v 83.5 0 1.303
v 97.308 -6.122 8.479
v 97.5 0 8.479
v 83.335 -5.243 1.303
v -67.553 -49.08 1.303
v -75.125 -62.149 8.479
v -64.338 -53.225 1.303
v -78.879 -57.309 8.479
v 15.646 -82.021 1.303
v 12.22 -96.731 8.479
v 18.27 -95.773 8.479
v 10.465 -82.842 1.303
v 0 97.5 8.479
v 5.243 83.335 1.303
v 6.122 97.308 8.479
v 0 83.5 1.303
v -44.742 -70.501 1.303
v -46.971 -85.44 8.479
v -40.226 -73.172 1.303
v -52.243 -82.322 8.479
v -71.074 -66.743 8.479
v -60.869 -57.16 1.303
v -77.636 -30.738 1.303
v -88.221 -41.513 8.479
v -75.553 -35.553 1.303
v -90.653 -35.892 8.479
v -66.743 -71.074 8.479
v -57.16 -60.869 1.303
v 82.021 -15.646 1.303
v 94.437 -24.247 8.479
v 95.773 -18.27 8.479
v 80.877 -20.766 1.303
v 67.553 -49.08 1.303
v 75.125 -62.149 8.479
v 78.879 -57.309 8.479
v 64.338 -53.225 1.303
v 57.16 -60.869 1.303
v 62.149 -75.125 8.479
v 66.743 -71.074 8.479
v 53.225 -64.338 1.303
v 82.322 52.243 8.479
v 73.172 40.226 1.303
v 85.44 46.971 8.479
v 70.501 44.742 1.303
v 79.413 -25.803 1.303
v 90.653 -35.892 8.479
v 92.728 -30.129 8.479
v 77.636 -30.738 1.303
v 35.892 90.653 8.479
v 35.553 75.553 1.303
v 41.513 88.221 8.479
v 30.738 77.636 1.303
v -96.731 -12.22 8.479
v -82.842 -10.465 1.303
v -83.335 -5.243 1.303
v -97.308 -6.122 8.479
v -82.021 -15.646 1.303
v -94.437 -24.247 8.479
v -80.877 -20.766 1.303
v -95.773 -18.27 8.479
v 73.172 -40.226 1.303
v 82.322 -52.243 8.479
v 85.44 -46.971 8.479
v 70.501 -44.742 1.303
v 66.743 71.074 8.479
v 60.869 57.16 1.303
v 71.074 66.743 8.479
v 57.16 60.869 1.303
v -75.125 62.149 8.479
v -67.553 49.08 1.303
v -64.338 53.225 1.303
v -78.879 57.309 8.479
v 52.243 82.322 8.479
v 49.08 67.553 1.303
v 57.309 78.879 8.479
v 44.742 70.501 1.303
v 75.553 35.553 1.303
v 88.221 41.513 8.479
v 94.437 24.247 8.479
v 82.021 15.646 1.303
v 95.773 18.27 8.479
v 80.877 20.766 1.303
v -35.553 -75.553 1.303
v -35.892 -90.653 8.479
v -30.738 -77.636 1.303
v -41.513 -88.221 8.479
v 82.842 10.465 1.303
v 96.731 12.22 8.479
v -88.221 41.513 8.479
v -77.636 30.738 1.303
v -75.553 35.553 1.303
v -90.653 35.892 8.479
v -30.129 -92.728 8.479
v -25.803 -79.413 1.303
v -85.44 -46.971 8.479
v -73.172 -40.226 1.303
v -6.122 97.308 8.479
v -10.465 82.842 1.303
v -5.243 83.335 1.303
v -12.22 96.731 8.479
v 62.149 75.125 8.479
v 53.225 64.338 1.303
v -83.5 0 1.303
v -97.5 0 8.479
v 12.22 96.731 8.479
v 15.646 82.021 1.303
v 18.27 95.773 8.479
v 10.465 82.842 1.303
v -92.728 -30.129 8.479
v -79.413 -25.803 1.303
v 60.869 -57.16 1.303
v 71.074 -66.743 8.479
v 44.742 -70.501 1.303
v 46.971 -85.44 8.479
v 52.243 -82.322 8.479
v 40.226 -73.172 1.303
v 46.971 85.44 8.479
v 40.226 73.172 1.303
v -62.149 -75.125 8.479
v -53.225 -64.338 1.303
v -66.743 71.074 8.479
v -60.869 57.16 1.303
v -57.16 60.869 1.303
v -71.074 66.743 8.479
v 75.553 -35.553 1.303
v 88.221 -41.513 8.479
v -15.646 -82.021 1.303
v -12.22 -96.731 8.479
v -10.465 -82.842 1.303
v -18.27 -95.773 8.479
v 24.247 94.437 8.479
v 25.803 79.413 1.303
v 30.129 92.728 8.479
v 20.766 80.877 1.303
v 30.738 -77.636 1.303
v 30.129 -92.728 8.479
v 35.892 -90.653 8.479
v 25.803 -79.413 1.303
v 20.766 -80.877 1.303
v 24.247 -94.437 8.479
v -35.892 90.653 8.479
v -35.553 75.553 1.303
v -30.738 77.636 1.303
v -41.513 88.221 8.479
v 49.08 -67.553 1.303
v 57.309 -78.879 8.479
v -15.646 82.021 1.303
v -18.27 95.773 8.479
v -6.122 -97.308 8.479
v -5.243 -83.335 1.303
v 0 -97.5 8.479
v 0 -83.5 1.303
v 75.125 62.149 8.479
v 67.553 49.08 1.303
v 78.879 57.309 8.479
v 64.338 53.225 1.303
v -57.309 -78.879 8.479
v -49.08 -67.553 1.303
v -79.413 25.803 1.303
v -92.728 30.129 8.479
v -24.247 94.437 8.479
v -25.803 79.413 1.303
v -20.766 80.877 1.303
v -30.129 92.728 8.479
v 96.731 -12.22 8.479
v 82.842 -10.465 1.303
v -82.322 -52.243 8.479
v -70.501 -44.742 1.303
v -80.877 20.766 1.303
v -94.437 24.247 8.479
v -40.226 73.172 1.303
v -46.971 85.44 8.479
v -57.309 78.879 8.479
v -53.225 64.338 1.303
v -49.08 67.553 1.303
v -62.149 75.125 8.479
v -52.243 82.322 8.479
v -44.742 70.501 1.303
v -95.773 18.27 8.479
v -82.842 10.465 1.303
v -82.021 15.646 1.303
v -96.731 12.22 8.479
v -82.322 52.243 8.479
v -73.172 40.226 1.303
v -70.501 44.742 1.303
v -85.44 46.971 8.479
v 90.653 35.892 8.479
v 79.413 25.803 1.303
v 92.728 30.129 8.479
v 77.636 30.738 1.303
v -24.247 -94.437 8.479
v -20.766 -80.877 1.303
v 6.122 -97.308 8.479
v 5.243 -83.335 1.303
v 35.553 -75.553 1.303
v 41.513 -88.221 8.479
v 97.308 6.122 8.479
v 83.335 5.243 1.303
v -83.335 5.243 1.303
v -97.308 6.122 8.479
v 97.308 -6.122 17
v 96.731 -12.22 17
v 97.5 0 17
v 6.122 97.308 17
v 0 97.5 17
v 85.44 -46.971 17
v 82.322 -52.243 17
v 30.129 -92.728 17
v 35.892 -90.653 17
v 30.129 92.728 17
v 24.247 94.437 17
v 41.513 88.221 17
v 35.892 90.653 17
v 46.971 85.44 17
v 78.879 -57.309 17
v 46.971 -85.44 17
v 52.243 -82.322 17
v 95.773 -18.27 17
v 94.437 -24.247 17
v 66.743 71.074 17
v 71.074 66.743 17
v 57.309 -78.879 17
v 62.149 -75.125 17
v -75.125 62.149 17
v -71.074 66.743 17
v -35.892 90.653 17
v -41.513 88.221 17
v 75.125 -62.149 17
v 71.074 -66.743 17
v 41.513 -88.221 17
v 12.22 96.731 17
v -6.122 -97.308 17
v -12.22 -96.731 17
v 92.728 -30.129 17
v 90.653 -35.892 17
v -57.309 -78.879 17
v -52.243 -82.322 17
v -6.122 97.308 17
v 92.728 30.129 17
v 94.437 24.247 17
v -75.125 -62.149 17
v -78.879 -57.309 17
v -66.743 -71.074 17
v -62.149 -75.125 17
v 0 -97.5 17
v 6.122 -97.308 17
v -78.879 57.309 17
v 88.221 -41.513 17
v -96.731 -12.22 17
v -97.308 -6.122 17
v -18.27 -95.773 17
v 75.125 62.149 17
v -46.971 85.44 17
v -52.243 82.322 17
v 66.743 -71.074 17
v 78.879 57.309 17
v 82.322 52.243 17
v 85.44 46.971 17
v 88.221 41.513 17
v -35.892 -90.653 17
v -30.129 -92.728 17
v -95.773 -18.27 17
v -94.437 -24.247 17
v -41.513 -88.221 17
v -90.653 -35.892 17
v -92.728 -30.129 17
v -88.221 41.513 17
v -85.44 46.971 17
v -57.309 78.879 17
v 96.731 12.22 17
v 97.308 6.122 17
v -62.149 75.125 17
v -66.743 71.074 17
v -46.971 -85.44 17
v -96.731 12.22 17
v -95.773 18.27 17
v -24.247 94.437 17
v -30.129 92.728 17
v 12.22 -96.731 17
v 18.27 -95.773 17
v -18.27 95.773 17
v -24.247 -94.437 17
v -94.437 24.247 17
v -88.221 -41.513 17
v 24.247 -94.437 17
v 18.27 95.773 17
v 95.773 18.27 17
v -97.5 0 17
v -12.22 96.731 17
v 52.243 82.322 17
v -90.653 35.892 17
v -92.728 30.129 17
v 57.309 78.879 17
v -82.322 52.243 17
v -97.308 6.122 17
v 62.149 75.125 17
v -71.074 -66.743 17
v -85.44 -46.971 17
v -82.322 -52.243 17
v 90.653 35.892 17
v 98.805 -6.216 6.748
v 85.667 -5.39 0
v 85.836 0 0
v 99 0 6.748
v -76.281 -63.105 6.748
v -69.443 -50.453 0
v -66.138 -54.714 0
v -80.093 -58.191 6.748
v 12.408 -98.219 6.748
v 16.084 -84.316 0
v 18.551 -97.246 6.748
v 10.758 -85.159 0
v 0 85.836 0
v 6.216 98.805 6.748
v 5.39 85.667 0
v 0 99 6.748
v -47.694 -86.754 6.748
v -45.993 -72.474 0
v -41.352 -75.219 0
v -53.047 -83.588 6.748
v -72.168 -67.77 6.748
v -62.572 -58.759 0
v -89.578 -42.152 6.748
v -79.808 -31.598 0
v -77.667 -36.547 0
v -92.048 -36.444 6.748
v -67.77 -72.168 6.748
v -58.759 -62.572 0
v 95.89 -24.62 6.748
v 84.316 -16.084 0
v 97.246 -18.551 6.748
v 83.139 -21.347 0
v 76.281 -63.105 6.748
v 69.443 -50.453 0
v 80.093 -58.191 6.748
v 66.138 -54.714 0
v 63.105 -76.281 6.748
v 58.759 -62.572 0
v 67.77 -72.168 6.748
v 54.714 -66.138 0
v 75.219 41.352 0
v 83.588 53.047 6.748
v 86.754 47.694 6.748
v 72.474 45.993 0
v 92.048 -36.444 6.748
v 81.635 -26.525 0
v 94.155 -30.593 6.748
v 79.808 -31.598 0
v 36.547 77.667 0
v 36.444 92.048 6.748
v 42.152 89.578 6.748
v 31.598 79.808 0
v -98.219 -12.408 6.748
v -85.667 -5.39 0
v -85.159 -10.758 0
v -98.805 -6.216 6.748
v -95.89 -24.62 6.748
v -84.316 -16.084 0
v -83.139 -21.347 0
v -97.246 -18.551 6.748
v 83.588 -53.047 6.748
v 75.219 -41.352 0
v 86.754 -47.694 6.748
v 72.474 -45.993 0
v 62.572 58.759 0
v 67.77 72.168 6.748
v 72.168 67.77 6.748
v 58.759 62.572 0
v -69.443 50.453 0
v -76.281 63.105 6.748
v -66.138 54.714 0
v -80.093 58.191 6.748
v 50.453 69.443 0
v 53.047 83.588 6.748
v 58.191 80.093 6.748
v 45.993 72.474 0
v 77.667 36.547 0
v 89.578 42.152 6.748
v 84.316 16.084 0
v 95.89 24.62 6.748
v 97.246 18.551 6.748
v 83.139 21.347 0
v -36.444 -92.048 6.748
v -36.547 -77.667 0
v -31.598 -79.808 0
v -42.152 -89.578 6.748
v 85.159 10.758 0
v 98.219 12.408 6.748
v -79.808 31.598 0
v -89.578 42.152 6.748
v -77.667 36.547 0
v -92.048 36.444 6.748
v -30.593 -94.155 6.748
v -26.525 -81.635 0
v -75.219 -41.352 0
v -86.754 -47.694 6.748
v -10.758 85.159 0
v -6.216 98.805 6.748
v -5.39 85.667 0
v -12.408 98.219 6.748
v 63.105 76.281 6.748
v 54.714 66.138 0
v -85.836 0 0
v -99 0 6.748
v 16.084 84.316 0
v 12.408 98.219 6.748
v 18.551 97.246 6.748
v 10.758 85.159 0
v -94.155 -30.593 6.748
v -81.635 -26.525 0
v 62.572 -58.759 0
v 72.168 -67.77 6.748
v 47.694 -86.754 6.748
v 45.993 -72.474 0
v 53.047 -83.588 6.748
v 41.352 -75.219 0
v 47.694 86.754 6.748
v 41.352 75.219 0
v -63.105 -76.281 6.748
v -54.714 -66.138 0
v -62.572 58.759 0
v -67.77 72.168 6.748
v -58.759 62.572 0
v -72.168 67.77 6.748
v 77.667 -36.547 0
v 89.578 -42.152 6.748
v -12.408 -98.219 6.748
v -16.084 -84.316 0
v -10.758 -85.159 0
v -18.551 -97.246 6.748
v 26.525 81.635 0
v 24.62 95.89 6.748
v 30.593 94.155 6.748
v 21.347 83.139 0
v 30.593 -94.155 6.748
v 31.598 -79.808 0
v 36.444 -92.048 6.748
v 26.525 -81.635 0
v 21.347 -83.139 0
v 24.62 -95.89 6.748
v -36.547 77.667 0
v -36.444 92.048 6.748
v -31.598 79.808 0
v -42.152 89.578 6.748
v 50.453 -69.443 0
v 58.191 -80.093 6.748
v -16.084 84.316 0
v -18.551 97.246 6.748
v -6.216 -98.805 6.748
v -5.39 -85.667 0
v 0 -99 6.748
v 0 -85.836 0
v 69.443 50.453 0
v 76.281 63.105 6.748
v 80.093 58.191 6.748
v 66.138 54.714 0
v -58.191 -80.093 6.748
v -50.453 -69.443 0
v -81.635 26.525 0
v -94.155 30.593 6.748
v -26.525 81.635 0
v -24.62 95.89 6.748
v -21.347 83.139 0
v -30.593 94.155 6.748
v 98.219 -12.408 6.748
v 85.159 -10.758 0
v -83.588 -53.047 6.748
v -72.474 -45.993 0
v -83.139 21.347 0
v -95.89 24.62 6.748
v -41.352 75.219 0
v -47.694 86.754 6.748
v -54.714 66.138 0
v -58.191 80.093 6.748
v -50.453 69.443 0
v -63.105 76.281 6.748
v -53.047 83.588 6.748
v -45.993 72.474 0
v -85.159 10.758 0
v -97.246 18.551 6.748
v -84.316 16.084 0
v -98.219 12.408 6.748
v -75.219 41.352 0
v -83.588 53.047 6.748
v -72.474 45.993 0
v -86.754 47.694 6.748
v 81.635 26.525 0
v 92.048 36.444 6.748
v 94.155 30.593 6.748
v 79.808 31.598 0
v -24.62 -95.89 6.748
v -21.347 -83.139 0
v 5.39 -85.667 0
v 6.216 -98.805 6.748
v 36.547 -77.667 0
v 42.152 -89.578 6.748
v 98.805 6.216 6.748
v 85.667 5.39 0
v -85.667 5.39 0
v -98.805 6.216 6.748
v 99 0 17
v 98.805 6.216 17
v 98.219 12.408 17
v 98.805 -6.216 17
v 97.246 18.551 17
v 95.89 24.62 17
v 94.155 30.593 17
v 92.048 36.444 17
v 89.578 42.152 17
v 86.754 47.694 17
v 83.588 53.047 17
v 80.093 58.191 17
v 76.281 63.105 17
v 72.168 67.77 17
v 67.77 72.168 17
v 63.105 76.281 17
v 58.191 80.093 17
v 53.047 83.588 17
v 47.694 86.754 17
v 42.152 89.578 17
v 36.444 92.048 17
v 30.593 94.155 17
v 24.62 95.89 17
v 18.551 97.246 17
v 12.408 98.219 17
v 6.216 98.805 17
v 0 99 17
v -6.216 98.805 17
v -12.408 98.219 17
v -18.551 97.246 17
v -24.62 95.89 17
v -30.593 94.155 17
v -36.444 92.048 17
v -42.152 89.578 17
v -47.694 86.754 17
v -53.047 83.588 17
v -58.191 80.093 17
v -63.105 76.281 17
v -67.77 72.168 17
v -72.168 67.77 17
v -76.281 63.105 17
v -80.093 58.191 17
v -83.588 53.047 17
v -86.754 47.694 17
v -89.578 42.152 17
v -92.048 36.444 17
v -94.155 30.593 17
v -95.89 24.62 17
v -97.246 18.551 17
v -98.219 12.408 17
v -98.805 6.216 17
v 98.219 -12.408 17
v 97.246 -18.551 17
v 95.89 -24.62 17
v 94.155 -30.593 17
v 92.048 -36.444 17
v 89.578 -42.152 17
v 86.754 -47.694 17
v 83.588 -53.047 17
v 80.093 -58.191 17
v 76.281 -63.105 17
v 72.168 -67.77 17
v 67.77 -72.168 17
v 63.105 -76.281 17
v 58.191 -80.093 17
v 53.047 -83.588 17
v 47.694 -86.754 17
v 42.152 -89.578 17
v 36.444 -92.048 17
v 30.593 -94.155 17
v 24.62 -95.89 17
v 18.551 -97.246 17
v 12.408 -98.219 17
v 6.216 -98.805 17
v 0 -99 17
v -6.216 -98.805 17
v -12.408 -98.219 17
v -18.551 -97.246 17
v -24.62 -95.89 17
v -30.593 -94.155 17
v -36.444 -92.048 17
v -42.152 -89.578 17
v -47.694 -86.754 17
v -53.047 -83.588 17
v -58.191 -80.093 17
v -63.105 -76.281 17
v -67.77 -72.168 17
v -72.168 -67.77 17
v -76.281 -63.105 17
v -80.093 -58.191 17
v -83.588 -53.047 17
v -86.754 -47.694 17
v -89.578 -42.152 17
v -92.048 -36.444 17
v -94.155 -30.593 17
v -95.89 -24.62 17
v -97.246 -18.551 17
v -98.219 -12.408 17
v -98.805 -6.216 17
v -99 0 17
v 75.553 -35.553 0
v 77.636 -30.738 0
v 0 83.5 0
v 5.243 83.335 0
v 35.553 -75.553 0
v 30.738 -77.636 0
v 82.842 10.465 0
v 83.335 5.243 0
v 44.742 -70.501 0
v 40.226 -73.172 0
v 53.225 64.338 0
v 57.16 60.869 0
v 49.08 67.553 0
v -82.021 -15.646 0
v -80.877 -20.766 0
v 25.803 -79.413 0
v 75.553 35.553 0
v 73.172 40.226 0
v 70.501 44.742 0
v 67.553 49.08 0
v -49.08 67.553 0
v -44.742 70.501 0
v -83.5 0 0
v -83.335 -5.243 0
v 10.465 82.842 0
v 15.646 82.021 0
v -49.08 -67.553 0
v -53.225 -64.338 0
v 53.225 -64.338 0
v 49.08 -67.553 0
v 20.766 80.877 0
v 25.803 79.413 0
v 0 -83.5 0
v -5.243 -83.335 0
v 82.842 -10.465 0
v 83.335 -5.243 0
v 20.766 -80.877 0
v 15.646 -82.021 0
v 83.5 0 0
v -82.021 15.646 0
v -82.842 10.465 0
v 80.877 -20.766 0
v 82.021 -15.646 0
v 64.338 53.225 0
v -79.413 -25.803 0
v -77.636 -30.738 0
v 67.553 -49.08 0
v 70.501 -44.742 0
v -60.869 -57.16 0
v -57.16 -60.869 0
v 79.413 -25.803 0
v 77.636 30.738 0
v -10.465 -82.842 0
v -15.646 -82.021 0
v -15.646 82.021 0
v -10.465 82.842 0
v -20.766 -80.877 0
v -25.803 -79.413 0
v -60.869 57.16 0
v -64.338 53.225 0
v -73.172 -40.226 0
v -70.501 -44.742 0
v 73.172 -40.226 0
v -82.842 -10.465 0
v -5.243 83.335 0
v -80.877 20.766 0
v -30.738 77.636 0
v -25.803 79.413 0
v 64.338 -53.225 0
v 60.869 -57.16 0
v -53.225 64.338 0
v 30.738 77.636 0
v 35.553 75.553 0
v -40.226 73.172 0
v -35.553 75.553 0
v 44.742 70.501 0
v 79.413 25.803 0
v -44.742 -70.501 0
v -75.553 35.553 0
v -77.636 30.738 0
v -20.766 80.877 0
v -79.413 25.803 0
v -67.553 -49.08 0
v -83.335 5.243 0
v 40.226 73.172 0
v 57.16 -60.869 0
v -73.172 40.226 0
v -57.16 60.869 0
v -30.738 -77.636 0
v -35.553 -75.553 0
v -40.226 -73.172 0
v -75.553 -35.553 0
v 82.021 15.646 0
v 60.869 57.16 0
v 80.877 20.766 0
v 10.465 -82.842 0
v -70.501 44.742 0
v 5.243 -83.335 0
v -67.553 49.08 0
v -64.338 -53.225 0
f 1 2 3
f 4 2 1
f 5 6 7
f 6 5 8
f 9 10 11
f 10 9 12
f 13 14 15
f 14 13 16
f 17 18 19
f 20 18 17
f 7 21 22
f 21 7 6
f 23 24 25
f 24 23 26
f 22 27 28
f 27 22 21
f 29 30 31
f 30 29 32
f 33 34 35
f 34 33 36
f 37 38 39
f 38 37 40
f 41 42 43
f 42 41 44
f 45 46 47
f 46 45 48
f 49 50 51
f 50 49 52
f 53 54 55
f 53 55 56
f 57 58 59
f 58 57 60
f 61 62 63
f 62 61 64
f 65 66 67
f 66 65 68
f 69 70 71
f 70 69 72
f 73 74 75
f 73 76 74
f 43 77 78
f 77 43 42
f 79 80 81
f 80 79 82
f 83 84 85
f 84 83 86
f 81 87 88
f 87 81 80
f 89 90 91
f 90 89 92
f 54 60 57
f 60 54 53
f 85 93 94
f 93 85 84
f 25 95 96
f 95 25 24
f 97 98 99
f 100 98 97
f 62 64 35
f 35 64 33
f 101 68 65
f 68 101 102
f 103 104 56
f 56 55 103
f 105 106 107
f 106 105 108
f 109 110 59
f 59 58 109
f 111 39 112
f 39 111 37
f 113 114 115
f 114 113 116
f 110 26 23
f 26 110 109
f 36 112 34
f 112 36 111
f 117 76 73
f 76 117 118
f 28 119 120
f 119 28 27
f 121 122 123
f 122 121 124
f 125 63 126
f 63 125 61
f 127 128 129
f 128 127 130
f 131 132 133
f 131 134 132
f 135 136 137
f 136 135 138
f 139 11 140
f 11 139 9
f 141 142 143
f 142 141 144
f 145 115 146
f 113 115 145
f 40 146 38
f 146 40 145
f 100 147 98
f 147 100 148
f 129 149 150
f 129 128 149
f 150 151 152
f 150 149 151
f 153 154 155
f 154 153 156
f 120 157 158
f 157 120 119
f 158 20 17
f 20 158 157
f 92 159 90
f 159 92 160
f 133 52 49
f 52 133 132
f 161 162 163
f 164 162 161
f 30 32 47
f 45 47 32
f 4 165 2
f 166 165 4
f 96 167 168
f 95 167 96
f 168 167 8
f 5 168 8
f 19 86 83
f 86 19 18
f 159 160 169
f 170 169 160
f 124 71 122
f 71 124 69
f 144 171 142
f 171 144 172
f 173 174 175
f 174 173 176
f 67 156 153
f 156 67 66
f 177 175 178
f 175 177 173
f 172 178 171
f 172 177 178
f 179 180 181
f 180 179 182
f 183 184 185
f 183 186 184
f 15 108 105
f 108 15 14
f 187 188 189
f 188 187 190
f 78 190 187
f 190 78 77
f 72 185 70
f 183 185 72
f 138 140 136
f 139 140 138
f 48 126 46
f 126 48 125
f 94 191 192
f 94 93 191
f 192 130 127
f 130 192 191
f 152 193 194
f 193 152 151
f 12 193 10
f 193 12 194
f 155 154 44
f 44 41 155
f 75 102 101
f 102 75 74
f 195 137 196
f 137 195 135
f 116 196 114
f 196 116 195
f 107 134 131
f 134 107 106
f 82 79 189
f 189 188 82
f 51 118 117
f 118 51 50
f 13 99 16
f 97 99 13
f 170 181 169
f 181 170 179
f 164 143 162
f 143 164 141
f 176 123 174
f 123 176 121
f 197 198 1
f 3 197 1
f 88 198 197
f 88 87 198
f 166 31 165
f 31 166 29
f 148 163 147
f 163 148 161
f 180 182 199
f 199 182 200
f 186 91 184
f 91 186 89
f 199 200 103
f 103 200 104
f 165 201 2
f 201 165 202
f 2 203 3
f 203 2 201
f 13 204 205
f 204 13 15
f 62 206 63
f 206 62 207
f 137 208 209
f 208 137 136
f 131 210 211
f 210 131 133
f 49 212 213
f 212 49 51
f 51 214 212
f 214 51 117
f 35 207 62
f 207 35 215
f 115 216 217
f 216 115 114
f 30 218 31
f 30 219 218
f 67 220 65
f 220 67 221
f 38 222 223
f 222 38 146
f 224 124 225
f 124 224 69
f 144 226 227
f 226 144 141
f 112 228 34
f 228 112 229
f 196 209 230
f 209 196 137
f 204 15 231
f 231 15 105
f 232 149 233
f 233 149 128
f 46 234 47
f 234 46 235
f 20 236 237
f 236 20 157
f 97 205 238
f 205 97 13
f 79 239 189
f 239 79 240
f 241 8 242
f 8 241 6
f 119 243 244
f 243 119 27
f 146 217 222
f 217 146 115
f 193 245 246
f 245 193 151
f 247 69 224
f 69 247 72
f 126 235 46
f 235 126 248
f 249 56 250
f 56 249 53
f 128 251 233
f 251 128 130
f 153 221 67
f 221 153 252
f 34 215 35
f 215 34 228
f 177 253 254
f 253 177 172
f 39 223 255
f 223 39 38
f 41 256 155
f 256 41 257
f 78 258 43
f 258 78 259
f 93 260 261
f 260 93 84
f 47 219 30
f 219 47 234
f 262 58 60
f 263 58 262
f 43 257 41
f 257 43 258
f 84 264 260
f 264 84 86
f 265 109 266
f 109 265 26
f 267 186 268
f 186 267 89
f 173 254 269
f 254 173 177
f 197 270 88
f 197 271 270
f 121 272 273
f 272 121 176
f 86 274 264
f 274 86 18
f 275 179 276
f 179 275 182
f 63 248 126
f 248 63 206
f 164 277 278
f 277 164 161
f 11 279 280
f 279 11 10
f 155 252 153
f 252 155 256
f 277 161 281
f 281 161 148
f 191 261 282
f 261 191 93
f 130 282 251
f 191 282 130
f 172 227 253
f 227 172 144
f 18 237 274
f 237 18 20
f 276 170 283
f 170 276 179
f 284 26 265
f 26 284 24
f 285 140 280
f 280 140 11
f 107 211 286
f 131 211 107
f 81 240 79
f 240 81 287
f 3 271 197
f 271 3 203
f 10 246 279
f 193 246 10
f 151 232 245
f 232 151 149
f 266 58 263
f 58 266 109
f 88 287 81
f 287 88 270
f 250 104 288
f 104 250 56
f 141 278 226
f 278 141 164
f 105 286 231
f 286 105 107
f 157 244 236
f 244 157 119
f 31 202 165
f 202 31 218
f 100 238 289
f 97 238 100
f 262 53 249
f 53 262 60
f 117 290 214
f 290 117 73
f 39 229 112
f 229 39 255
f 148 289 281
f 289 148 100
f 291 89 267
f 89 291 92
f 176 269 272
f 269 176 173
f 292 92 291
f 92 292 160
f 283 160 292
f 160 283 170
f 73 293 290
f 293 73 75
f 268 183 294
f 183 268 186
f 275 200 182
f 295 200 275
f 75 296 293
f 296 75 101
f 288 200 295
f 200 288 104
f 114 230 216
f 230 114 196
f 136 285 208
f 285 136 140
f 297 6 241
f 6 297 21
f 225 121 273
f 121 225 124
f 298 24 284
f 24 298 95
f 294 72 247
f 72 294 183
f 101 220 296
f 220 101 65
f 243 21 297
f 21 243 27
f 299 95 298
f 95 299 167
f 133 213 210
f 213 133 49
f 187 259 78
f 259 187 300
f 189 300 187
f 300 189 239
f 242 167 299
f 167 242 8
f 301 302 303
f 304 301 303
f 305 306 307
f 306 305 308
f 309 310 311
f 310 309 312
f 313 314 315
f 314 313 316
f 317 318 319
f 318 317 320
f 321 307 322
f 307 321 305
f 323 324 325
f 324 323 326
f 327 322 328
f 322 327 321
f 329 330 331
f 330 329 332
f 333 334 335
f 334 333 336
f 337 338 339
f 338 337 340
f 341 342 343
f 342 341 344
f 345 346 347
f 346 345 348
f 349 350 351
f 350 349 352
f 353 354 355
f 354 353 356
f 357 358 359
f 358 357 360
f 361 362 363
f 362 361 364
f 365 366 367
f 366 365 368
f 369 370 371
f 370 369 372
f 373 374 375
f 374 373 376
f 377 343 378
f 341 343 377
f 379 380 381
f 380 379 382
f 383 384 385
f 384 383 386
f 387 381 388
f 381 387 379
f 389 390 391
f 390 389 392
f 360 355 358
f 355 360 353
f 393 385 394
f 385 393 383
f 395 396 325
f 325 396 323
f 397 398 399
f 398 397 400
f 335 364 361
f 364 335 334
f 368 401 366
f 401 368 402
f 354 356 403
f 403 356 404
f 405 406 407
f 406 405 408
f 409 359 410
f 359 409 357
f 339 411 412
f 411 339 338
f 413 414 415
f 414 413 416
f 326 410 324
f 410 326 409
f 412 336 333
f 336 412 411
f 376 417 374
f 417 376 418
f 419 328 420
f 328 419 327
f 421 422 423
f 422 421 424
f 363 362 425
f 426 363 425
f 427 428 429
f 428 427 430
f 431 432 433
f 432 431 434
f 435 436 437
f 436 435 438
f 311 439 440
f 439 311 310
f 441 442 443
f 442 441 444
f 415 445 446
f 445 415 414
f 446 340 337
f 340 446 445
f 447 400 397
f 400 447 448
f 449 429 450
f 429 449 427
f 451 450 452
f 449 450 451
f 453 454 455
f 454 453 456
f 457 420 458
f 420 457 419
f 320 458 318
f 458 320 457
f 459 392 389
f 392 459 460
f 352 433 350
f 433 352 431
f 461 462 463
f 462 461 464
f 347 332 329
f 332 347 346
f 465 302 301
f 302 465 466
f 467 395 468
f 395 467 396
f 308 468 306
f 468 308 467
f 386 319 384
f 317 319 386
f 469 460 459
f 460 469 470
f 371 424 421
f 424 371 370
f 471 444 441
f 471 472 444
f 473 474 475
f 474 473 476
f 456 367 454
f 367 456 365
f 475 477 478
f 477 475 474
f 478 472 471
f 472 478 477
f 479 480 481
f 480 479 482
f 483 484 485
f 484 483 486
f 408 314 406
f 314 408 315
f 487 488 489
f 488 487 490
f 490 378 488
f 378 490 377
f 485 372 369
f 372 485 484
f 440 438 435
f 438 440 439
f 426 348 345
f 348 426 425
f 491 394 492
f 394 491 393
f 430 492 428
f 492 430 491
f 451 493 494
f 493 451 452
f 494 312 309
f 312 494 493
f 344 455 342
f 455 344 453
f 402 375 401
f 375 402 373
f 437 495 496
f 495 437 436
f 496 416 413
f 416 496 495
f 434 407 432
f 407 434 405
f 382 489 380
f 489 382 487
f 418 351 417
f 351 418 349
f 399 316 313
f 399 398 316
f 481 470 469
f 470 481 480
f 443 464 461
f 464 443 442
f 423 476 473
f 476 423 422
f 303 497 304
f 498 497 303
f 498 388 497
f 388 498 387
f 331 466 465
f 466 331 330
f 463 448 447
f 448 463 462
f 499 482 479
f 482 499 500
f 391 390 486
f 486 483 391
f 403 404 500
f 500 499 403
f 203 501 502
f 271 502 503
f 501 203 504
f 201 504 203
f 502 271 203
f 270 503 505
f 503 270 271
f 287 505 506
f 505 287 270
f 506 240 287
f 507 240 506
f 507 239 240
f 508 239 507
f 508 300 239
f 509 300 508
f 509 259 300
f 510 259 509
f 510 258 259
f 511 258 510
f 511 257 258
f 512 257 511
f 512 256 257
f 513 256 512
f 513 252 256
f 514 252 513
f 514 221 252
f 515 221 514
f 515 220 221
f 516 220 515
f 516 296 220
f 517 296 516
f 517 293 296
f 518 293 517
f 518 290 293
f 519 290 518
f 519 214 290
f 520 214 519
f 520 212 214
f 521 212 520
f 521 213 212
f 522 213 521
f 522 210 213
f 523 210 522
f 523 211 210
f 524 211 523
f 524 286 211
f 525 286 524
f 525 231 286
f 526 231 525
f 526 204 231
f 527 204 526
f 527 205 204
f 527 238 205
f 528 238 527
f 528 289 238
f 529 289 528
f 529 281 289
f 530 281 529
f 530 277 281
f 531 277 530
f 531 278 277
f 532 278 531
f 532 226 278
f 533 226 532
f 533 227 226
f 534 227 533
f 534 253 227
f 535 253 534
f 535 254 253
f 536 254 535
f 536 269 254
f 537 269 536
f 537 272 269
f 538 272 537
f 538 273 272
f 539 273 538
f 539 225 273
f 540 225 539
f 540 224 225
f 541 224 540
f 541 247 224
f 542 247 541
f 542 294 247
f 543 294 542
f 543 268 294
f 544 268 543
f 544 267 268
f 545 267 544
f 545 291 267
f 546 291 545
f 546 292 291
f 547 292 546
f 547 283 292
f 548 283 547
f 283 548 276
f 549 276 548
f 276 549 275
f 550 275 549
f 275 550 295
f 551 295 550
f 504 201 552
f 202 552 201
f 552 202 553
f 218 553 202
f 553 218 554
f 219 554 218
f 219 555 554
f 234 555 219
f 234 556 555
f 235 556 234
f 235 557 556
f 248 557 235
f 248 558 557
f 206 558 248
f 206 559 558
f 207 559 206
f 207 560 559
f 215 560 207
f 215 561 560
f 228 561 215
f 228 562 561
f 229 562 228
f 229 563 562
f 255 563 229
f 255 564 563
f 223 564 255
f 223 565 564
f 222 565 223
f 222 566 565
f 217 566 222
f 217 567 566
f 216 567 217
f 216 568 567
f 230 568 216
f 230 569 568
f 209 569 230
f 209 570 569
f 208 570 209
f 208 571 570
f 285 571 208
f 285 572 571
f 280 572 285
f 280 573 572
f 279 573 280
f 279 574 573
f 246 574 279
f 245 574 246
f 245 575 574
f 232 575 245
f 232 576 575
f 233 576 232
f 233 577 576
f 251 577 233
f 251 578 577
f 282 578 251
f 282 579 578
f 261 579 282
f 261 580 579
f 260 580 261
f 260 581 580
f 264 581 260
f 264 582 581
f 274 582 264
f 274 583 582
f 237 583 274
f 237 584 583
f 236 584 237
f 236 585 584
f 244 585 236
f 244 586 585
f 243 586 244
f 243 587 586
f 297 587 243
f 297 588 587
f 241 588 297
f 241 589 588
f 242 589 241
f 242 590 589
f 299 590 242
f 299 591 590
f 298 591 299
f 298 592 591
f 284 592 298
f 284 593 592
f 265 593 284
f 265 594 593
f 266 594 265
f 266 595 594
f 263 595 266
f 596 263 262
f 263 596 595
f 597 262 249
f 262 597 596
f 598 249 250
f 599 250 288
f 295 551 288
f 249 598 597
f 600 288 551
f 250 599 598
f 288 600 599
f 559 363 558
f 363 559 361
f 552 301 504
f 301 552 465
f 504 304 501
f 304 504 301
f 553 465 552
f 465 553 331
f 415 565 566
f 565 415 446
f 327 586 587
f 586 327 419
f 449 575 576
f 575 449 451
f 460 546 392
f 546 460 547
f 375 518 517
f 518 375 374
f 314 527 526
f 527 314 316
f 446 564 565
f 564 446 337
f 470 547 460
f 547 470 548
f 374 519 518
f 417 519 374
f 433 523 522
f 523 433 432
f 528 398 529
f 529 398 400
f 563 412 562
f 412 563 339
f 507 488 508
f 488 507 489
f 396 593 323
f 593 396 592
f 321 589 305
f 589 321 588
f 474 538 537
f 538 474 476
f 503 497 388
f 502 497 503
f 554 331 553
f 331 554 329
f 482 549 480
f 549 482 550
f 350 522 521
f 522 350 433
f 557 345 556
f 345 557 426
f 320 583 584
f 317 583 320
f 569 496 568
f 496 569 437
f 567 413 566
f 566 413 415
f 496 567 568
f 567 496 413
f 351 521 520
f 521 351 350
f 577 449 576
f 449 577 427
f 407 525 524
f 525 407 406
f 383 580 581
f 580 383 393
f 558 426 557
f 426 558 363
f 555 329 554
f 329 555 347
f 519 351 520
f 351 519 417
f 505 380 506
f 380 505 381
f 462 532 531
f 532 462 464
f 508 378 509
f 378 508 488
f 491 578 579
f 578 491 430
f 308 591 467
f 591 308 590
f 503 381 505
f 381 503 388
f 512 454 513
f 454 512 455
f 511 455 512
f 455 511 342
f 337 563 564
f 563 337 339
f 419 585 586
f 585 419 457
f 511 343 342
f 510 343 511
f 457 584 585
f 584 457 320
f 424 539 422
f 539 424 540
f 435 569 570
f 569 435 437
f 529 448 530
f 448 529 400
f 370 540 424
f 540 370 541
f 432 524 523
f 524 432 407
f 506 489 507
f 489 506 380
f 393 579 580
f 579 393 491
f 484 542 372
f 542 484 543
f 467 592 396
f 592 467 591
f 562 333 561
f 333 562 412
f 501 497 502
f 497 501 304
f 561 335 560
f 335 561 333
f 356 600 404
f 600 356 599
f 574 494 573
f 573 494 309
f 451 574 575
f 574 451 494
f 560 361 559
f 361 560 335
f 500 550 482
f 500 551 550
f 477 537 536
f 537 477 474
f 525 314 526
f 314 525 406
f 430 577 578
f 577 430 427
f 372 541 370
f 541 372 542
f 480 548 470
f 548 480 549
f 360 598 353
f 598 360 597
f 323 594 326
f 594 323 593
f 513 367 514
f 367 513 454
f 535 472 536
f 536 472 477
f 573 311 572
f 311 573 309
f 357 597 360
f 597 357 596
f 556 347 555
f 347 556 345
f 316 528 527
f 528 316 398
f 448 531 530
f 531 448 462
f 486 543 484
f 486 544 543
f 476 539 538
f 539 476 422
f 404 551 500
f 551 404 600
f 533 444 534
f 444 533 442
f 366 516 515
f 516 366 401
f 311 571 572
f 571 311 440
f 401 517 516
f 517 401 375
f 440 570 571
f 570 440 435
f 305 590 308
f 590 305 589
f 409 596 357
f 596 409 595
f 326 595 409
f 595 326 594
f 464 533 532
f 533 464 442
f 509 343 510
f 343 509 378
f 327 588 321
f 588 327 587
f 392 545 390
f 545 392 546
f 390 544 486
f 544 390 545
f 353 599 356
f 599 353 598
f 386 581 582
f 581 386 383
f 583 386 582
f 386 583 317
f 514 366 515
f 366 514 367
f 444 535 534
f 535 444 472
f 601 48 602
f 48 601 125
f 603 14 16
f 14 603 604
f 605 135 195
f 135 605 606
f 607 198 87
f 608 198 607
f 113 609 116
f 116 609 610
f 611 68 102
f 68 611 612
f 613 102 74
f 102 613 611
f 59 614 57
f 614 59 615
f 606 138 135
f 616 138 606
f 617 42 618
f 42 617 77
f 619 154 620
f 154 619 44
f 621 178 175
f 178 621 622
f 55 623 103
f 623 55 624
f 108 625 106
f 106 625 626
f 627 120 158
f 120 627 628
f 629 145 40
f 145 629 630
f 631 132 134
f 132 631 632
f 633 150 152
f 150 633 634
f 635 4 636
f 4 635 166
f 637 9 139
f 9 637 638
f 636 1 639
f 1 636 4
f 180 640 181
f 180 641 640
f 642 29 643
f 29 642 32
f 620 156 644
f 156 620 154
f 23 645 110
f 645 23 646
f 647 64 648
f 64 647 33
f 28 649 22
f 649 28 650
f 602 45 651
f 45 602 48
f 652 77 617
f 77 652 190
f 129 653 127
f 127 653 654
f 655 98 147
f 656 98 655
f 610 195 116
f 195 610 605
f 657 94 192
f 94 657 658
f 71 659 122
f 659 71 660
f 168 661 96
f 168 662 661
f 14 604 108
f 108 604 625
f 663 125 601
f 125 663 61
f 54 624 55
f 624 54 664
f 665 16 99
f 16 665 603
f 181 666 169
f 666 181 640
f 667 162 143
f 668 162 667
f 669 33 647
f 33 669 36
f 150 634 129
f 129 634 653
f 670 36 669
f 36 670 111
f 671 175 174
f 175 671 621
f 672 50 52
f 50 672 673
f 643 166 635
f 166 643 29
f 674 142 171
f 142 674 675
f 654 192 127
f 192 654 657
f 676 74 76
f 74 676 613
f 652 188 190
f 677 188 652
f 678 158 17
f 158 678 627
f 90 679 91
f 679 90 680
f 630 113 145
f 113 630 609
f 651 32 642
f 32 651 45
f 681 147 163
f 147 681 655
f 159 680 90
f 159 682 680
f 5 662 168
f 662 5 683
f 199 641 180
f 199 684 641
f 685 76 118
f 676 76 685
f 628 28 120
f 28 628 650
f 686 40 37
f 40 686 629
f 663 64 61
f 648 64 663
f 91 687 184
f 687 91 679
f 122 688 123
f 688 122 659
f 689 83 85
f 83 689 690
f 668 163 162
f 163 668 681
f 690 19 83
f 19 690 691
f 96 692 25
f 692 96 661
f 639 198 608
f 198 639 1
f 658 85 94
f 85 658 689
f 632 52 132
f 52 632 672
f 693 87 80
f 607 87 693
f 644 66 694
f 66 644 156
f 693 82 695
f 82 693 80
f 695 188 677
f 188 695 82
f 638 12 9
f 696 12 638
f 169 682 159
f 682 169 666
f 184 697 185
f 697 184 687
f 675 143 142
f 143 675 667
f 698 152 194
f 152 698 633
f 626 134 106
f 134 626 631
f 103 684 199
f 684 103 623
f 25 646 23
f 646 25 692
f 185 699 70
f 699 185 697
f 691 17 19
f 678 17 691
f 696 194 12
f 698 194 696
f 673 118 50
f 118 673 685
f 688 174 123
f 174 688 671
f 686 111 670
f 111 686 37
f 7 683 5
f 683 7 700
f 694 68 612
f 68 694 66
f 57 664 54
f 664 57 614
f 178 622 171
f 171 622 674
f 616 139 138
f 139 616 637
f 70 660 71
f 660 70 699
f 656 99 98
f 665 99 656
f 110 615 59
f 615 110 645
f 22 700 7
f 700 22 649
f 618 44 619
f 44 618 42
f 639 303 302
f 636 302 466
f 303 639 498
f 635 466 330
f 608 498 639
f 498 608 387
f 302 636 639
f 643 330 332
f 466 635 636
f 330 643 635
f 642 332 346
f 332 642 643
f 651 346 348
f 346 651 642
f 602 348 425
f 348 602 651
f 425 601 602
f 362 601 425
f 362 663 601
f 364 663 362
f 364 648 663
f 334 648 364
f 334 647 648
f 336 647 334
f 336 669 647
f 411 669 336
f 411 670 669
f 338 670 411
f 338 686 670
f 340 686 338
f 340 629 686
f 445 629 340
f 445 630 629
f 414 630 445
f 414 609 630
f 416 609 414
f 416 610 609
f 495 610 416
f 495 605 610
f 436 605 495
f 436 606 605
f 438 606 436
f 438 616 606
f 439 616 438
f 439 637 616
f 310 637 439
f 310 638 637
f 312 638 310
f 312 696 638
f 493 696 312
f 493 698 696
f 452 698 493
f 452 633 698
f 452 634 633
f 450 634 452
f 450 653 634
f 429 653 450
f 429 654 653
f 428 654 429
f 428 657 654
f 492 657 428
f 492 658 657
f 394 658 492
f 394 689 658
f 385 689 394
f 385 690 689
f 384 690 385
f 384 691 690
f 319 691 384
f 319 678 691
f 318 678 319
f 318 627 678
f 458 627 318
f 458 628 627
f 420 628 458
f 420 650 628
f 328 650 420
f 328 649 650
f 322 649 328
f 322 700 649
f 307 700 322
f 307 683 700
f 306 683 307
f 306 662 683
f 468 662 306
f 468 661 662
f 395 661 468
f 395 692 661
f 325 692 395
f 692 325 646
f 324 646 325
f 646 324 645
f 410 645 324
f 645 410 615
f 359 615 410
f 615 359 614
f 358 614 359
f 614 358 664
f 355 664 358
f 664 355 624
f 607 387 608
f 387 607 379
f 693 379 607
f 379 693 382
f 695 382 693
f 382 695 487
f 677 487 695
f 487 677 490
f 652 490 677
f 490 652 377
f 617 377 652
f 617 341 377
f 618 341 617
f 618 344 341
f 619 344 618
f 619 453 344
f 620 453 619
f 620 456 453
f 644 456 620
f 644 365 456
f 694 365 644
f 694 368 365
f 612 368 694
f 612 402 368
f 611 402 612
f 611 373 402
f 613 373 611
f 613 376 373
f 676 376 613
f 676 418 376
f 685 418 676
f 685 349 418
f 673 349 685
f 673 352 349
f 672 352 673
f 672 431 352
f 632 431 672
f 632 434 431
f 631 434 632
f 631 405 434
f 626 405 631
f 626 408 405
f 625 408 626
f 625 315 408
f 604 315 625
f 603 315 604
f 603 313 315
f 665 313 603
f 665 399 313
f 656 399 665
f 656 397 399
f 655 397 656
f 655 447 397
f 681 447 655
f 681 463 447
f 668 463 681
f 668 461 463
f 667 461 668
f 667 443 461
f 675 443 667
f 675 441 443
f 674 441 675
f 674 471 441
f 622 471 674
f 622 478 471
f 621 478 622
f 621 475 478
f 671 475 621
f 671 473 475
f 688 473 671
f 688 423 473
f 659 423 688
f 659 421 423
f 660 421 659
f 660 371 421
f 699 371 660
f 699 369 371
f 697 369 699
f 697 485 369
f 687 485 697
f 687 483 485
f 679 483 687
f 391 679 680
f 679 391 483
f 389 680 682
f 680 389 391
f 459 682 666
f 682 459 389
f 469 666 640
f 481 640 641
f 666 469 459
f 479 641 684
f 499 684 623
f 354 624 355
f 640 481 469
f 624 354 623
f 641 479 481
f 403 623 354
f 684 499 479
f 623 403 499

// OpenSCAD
// Обод для лампы:

$fn = 100; // Разрешение поверхности.

module rim() {
    translate([0, 0, 0.8]) {
        union() {
            difference() { // Центральное отверстие:
                intersection() { // Внешнее ограничение по радиусу:
                    difference() { // Наклонный обод:
                        cylinder(h = 61, r1 = 119, r2 = 0); // Внешний конус.
                        translate([0, 0, -2.5]) { // Смещение внутреннего конуса для создания толщины стенки:
                            intersection() { // Ограничение конуса по радиусу:
                                cylinder(h = 61, r1 = 119, r2 = 0); // Внутренний конус.
                                cylinder(h = 21, r = 97.5); // Ограничитель.
                            }
                        }
                    }
                    // Внешний ограничитель:
                    translate([0, 0, -1]) cylinder(h = 20 - 0.8, r = 99.0);
                }
                translate([0, 0, -1]) cylinder(h = 22, r = 83.5); // Центр.
                translate([-100, -100, 17]) cube([200, 200, 10]);
            }
            
            // Дополнительное увеличение по высоте:
            /*translate([0, 0, -1])
            {
                difference() {
                    cylinder(h = 1, r = 99.0);
                    translate([0, 0, -1]) cylinder(h = 3, r = 97.5);
                }
            }*/
        }
    }
}

// Подготовка к печати:
translate([0, 0, 17.8]) rotate([180, 0, 0]) rim();
